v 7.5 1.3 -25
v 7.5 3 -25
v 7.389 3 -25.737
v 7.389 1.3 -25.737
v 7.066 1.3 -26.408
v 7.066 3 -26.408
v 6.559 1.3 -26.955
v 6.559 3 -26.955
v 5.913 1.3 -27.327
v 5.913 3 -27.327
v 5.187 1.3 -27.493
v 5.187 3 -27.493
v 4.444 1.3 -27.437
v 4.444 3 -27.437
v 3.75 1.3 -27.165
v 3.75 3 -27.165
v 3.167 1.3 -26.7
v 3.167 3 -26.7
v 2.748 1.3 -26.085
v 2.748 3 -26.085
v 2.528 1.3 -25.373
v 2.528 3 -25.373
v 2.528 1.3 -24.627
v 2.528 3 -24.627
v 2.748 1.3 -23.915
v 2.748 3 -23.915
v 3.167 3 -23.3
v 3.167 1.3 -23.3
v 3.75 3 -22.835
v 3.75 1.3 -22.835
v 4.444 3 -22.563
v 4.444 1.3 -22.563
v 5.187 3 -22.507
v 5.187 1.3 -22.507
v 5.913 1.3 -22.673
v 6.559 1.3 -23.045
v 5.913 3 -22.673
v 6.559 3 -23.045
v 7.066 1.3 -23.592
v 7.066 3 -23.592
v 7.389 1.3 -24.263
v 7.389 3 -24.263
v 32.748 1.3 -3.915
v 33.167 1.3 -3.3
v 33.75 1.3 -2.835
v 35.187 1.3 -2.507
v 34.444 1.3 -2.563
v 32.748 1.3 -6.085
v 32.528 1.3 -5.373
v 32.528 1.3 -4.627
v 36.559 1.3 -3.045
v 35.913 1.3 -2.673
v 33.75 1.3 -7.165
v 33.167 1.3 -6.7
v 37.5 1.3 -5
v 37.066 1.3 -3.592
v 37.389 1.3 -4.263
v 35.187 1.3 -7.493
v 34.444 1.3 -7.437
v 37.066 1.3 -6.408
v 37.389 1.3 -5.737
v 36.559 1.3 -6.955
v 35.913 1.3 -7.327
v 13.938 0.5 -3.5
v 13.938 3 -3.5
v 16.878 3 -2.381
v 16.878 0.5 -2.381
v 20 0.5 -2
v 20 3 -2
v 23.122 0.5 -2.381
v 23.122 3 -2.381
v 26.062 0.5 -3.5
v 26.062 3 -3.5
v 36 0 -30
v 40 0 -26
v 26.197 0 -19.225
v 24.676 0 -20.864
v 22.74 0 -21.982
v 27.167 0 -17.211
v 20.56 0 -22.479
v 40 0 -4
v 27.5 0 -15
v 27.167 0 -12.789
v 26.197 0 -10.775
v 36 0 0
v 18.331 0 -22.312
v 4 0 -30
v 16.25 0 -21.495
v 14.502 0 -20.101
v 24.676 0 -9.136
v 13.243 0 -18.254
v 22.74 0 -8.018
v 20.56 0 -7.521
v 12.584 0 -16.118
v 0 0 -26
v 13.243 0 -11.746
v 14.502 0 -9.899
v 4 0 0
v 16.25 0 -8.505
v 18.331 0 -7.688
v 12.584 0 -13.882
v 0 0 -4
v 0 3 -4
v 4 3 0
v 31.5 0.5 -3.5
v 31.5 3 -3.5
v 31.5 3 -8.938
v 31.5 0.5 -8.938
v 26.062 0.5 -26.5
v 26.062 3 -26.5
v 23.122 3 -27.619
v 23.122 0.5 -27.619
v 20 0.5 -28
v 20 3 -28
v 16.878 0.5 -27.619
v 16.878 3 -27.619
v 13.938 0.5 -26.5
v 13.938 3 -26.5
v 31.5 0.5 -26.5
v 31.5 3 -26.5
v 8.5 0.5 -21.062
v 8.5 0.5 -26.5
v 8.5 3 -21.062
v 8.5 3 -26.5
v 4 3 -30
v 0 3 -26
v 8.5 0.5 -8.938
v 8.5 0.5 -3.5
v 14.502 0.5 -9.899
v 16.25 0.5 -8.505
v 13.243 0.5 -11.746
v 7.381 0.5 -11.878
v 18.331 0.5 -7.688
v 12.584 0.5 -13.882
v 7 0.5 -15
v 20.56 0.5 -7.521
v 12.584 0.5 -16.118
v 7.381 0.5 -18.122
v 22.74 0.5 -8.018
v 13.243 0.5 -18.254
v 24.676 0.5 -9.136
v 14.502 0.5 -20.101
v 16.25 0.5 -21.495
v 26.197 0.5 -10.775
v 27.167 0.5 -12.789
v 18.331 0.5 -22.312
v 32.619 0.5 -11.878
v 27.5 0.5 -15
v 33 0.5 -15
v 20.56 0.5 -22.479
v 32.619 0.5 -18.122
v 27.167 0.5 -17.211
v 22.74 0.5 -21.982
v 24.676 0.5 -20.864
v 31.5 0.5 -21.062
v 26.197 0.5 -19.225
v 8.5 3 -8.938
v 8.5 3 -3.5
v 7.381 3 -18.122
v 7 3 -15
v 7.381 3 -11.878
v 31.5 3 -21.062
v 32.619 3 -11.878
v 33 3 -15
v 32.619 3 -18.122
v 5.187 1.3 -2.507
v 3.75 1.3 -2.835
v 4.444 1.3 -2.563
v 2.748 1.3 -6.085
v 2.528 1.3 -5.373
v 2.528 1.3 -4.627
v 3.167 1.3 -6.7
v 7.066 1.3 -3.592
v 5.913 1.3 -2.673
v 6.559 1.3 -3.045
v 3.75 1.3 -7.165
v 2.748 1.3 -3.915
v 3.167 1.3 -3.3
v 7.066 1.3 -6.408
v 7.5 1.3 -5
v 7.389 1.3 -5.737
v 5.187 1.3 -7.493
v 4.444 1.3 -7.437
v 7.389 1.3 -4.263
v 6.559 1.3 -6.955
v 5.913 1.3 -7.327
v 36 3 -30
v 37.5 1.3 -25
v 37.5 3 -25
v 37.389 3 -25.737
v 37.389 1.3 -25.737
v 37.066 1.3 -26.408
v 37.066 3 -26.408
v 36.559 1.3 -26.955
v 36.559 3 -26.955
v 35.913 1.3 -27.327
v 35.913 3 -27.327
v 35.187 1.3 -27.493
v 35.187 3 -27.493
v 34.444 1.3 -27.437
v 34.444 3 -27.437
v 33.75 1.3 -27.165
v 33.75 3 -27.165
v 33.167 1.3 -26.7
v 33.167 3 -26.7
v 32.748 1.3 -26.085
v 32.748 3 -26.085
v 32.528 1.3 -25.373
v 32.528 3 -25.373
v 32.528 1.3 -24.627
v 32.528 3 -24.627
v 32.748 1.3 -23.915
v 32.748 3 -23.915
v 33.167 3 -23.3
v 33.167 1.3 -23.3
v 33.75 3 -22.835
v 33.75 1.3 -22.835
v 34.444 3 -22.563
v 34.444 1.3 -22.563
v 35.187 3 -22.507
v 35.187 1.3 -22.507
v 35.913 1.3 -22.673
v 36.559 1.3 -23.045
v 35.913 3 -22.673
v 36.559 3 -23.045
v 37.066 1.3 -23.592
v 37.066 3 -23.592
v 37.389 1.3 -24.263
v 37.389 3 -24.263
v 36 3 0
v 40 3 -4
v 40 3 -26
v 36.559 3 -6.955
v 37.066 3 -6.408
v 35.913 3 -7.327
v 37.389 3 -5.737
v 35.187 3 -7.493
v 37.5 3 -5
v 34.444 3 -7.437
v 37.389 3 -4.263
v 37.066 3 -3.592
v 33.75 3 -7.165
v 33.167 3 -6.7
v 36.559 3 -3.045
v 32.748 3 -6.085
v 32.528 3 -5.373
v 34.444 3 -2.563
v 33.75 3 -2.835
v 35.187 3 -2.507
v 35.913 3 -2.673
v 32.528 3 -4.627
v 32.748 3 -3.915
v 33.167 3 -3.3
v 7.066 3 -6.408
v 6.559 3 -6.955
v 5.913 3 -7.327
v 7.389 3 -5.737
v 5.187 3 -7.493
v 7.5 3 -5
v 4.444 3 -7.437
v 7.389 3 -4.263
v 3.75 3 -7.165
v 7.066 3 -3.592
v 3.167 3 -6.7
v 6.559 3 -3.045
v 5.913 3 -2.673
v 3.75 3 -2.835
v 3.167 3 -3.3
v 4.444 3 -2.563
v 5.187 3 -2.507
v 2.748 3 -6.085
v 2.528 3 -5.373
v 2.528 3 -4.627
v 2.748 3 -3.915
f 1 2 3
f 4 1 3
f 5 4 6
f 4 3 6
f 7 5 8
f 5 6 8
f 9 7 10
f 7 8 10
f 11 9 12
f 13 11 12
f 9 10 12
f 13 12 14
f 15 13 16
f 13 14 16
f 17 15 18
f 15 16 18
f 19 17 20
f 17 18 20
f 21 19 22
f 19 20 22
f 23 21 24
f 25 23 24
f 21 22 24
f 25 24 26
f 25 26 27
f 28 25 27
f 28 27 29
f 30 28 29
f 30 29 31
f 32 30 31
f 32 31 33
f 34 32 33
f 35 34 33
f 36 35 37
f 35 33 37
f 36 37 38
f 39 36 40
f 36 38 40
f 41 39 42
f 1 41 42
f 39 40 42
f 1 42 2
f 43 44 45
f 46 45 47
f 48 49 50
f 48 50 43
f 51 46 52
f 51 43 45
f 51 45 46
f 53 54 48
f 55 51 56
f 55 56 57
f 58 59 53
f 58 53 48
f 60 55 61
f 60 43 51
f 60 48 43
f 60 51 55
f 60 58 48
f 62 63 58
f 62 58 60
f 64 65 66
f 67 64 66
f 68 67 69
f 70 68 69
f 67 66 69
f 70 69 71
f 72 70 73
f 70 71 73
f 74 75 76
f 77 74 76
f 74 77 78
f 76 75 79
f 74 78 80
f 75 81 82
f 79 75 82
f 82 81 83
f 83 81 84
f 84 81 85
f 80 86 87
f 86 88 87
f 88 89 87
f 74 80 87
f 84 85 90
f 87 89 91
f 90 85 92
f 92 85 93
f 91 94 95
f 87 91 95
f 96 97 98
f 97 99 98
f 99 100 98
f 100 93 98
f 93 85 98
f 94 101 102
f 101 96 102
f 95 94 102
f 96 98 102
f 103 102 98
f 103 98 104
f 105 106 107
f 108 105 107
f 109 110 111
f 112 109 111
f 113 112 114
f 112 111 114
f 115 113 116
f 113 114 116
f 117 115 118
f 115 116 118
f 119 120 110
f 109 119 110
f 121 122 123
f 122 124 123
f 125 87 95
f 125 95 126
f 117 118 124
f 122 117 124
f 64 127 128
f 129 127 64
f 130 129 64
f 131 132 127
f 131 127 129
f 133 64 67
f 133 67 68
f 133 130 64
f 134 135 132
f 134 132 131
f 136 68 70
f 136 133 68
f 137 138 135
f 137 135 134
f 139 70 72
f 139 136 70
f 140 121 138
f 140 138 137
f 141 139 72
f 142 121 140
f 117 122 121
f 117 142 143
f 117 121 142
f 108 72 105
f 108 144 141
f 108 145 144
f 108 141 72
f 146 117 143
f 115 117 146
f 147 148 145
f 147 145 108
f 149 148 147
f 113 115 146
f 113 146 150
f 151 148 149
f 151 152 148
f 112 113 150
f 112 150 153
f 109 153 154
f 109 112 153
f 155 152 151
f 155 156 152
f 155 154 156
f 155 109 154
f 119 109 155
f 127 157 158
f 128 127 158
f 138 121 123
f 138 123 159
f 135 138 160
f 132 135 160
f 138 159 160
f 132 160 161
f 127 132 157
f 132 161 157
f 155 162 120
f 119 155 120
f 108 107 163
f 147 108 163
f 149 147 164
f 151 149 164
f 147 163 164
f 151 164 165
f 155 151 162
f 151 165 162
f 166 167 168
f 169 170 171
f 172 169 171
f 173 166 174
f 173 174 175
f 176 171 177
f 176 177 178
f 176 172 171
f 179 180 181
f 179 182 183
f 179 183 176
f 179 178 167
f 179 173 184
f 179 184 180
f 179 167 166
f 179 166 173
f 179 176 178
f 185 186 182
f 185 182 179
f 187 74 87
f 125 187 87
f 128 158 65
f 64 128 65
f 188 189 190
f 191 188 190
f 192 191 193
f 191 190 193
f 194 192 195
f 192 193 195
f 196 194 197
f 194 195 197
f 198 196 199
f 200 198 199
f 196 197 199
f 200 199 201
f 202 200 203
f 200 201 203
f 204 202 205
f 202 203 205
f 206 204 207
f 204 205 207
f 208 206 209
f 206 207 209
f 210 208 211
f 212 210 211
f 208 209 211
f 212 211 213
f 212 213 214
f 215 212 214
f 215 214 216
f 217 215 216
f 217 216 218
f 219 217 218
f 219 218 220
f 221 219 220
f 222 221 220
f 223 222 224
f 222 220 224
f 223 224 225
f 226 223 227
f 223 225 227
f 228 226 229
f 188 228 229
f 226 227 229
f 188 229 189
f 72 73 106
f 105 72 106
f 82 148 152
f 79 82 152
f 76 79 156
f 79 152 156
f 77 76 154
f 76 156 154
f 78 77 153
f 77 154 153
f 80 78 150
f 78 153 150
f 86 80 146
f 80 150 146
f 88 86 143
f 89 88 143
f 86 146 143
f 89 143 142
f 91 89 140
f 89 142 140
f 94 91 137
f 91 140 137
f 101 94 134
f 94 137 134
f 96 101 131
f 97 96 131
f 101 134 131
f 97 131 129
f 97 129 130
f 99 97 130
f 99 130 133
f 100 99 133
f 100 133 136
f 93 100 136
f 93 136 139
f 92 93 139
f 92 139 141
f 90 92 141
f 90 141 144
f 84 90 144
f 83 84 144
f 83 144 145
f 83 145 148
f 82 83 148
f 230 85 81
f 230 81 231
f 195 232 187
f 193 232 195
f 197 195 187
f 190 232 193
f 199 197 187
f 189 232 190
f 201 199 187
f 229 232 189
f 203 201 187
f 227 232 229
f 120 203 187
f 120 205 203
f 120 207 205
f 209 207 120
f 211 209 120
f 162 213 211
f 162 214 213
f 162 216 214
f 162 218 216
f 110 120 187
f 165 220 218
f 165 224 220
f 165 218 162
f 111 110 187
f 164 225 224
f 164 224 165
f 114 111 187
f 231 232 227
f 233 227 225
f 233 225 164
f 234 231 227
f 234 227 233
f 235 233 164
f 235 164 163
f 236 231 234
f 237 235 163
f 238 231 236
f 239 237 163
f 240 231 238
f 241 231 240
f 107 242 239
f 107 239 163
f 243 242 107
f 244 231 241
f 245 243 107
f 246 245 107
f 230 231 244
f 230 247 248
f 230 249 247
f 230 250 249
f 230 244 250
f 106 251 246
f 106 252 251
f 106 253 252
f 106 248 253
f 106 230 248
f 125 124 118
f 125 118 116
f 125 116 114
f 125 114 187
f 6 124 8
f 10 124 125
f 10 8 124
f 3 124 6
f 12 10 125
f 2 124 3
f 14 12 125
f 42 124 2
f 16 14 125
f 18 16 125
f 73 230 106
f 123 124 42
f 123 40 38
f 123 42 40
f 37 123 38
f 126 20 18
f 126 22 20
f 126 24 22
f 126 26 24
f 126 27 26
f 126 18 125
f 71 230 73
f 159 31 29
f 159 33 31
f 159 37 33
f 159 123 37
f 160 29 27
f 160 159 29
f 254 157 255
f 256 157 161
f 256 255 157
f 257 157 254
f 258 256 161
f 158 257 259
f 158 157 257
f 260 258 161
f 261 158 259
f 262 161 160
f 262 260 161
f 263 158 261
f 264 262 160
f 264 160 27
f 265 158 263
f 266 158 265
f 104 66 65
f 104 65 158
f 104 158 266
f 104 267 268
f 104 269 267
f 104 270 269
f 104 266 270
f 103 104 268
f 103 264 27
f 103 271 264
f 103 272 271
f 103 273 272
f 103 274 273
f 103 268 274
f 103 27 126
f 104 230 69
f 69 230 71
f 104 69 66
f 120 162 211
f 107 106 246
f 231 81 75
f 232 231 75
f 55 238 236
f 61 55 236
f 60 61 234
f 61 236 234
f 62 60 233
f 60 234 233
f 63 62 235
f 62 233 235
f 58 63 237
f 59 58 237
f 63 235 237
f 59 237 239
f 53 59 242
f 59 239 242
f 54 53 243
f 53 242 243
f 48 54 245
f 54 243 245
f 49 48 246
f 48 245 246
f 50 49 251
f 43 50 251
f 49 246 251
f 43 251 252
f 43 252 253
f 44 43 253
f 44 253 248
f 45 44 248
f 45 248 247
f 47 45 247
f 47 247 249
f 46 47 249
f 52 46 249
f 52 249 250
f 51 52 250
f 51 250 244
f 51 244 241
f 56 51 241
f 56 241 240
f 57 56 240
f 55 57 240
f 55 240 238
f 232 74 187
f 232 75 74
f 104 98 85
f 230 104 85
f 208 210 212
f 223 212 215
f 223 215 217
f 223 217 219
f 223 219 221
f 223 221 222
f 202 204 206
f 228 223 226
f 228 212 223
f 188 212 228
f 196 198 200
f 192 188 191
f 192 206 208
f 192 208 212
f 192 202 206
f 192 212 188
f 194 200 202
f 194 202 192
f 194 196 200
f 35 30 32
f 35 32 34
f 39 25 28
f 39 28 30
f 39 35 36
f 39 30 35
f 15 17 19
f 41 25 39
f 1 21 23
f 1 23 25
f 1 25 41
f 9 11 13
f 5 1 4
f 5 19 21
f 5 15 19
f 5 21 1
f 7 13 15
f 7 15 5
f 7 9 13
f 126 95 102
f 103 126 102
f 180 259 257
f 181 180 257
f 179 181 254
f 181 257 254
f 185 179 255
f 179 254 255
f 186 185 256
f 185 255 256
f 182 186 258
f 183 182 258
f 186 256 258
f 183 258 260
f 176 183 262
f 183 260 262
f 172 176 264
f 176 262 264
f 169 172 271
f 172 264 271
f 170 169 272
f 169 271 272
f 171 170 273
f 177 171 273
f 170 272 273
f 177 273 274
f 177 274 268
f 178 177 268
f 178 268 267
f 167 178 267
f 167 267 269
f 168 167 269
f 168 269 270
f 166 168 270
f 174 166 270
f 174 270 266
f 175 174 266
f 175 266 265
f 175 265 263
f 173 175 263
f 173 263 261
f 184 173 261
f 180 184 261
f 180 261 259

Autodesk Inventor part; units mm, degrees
ref_plane "YZ Plane" through (0, 0, 0) normal (1, 0, 0) x (0, 1, 0)
ref_plane "XZ Plane" through (0, 0, 0) normal (0, 1, 0) x (-1, 0, 0)
ref_plane "XY Plane" through (0, 0, 0) normal (0, 0, 1) x (1, 0, 0)
sketch "Sketch1" plane through (0, 0, 0) normal (0, 1, 0) x (-1, 0, 0)
  line L0 (0, 0) -> (-40, 0)
  line L1 (-40, 0) -> (-40, -30)
  line L2 (-40, -30) -> (0, -30)
  line L3 (0, -30) -> (0, 0)
  dimension "d0" = 30
  dimension "d1" = 40
extrude "Extrusion1" add sketch "Sketch1" along normal blind 3
sketch "Sketch2" plane through (0, 3, 0) normal (0, 1, 0) x (1, 0, 0)
  circle A0 centre (20, 15) radius 13
  line L0 (0, 30) -> (0, 0) projected
  line L1 (0, 0) -> (40, 0) projected
  line L2 (8.5, 3.5) -> (31.5, 3.5)
  line L3 (31.5, 3.5) -> (31.5, 26.5)
  line L4 (31.5, 26.5) -> (8.5, 26.5)
  line L5 (8.5, 26.5) -> (8.5, 3.5)
  line L6 (40, 0) -> (40, 30) projected
  dimension "d4" = 20
  dimension "d5" = 26
  dimension "d25" = 15
  dimension "d29" = 23
  dimension "d30" = 23
  dimension "d31" = 3.5
  dimension "d32" = 8.5
extrude "Extrusion2" cut sketch "Sketch2" against normal blind 2.5 contours A0 L3 | L3 A0 L2 L5 L4 | L4 A0 | A0 L2 | L5 A0
sketch "Sketch3" plane through (20, 0.5, -15) normal (0, 1, 0) x (1, 0, 0)
  circle A0 centre (0, 0) radius 7.5
  point P0 (-20, -15)
  dimension "d8" = 15
extrude "Extrusion3" cut sketch "Sketch3" against normal blind 3.5
sketch "Sketch4" plane through (0, 3, 0) normal (0, 1, 0) x (1, 0, 0)
  circle A0 centre (5, 5) radius 2.5
  circle A1 centre (5, 25) radius 2.5
  circle A2 centre (35, 5) radius 2.5
  circle A3 centre (35, 25) radius 2.5
  circle A4 centre (20, 15) radius 7.5 projected
  point P0 (0, 0)
  dimension "d11" = 5
  dimension "d12" = 5
  dimension "d13" = 5
  dimension "d14" = 5
  dimension "d15" = 15
  dimension "d16" = 15
  dimension "d17" = 15
  dimension "d18" = 15
  dimension "d19" = 10
  dimension "d20" = 10
  dimension "d21" = 10
  dimension "d22" = 10
extrude "Extrusion4" cut sketch "Sketch4" against normal blind 1.7 contours A0 | A1 | A2 | A3
chamfer "Chamfer1" distance 4 angle 45 1 edges at (40, 1.5, -30)
chamfer "Chamfer2" distance 4 angle 45 1 edges at (40, 1.5, 0)
chamfer "Chamfer3" distance 4 angle 45 1 edges at (0, 1.5, 0)
chamfer "Chamfer4" distance 4 angle 45 1 edges at (0, 1.5, -30)
sketch "Sketch5" plane through (0, 3, 0) normal (0, 1, 0) x (1, 0, 0)
  line L0 (8.5, 3.5) -> (31.5, 3.5)
  line L1 (31.5, 3.5) -> (31.5, 26.5)
  line L2 (31.5, 26.5) -> (8.5, 26.5)
  line L3 (8.5, 26.5) -> (8.5, 3.5)
  line L4 (4, 0) -> (36, 0) projected
  line L5 (40, 4) -> (40, 26) projected
  point P0 (0, 0)
  dimension "d42" = 23
  dimension "d43" = 23
  dimension "d44" = 3.5
  dimension "d45" = 8.5
extrude "Extrusion5" cut sketch "Sketch5" against normal blind 2.5
properties part number "chamber_bottom"
